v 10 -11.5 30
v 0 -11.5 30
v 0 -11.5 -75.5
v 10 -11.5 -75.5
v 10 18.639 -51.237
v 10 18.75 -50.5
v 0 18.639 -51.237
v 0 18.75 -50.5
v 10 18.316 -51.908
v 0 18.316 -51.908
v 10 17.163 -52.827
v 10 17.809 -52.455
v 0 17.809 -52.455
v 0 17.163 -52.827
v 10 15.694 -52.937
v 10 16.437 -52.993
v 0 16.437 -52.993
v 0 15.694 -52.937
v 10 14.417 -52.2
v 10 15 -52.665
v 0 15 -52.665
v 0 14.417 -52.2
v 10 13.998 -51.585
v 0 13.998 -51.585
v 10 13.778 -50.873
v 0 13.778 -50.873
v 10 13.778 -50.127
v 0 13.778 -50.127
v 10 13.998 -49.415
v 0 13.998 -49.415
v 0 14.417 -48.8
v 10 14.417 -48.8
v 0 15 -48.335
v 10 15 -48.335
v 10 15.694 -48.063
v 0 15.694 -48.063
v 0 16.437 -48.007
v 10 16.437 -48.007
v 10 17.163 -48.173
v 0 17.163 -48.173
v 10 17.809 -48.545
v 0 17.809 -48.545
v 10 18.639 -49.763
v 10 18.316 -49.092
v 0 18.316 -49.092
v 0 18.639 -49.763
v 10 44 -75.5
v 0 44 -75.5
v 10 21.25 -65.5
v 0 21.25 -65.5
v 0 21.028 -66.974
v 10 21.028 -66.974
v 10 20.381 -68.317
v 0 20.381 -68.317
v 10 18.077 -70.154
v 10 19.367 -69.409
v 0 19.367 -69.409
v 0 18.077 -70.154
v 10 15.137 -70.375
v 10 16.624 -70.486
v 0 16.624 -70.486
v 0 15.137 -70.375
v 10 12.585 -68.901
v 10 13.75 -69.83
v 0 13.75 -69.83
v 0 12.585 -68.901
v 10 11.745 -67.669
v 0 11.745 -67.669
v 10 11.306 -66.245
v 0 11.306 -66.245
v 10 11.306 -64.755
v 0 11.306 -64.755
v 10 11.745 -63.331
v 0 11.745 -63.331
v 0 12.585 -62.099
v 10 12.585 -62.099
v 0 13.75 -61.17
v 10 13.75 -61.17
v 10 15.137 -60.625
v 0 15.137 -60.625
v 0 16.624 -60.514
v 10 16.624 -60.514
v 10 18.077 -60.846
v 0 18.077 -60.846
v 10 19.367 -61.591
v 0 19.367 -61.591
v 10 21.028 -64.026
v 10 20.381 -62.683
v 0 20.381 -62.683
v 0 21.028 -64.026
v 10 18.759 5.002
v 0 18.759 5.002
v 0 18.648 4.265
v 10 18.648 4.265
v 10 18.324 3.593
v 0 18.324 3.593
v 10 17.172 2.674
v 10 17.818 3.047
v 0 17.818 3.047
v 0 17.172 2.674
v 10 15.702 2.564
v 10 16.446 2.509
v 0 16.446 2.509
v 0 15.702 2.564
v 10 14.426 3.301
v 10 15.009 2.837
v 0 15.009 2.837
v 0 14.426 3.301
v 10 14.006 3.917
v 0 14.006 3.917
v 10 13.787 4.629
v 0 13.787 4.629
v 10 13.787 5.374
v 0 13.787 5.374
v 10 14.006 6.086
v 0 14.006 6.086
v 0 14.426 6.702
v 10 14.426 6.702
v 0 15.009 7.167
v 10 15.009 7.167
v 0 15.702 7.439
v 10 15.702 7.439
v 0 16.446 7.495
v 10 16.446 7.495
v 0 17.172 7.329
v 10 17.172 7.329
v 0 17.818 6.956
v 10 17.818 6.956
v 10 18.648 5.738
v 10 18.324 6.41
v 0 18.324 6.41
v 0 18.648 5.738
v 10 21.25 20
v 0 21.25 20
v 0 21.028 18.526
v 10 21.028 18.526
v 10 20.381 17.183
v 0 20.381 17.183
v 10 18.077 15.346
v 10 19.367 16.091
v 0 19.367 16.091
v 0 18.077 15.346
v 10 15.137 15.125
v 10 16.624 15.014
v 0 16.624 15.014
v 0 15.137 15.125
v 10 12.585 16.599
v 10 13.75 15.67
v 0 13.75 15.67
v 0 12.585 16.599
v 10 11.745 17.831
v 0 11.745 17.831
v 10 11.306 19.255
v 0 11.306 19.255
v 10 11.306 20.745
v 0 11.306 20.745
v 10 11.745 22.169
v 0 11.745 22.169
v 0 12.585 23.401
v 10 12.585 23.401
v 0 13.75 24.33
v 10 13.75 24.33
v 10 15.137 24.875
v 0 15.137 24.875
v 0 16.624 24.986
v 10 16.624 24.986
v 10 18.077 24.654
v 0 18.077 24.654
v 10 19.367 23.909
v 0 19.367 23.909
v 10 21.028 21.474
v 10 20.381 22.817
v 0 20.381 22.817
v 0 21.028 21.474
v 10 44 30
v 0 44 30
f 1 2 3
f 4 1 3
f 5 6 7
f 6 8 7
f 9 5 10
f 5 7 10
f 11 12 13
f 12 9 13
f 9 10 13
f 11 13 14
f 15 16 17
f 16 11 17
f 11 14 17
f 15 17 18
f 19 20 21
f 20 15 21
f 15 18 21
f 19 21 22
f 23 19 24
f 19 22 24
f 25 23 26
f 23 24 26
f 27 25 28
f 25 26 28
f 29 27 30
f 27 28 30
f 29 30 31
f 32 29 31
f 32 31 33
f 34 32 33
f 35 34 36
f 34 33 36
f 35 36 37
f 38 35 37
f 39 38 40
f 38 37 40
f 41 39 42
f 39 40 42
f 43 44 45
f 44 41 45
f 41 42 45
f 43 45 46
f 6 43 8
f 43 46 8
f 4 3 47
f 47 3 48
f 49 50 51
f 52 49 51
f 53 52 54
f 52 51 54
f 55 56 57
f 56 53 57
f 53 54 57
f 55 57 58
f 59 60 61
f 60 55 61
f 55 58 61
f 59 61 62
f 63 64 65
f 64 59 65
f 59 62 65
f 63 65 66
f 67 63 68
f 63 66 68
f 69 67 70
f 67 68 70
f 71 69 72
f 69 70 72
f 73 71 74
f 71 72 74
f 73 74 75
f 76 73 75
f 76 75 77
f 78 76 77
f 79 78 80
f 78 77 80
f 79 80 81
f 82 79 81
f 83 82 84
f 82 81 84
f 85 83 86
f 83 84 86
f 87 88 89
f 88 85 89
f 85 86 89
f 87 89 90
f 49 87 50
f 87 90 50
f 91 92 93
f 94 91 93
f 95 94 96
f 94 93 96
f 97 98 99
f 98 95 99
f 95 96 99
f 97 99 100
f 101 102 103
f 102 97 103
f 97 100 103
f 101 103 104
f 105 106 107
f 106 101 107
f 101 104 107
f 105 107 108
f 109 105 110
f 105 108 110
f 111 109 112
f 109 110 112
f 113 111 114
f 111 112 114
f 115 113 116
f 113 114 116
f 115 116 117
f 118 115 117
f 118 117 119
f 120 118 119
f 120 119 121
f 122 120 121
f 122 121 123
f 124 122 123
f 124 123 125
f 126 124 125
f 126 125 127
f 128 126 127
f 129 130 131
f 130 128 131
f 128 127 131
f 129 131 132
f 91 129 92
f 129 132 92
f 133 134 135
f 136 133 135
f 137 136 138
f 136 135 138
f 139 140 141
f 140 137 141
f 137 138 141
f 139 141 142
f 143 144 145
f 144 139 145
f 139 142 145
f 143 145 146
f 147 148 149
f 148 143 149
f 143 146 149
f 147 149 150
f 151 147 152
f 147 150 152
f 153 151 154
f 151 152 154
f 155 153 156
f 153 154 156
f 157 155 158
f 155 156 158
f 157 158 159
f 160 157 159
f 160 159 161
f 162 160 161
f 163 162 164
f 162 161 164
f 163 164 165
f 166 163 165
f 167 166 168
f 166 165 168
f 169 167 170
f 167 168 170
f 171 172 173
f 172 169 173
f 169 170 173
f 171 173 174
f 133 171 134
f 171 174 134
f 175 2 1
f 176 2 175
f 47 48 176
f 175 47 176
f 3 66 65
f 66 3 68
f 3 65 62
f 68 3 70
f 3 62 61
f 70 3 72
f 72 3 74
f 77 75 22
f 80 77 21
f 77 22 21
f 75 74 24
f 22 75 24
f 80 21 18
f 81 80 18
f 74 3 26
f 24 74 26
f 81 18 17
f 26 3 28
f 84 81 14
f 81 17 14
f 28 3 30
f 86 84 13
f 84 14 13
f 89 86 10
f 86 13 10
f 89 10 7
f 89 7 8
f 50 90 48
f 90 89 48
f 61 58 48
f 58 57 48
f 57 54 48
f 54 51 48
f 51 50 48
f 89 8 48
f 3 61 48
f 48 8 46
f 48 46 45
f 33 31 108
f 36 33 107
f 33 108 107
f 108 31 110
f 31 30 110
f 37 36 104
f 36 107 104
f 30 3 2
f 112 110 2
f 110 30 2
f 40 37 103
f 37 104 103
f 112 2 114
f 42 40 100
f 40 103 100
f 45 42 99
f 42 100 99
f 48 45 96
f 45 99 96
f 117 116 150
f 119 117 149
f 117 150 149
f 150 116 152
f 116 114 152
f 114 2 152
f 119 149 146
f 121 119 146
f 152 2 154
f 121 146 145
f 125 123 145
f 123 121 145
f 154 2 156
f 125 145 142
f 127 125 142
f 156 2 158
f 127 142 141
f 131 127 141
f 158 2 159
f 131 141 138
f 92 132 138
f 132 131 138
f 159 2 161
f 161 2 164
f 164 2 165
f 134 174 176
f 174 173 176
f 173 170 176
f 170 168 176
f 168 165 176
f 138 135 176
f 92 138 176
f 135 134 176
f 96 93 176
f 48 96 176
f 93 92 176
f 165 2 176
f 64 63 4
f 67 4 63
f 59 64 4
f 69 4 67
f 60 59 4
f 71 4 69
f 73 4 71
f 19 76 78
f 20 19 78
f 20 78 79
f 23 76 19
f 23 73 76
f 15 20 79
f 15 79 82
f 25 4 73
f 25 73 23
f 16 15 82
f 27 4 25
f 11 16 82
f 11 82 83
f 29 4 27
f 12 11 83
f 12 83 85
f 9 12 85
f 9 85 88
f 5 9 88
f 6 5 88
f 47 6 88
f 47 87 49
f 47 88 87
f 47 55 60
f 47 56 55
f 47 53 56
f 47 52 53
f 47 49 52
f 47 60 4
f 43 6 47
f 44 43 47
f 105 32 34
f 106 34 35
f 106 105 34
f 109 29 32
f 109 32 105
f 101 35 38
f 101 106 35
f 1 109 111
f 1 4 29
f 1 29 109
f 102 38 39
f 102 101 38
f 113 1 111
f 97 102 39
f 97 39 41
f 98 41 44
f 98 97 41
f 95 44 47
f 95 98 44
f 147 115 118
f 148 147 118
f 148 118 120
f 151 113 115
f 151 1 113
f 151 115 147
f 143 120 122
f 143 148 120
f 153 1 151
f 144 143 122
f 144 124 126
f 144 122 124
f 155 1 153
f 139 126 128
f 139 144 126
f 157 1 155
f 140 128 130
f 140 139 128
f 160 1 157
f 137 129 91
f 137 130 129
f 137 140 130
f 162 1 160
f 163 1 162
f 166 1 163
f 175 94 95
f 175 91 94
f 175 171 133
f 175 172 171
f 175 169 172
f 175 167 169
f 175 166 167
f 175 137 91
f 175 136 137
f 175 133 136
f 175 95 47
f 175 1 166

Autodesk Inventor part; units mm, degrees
ref_plane "YZ Plane" through (0, 0, 0) normal (1, 0, 0) x (0, 1, 0)
ref_plane "XZ Plane" through (0, 0, 0) normal (0, 1, 0) x (-1, 0, 0)
ref_plane "XY Plane" through (0, 0, 0) normal (0, 0, 1) x (1, 0, 0)
sketch "Sketch1" plane through (0, 0, 0) normal (1, 0, 0) x (0, 1, 0)
  line L0 (-6, -12.5) -> (-6, -12.9)
  arc A0 (-6, -12.9) -> (-5.6, -13.3) centre (-5.6, -12.9) ccw
  line L1 (-5.6, -13.3) -> (-4.9, -13.3)
  arc A1 (-4.9, -13.3) -> (-4.7, -13.1) centre (-4.9, -13.1) ccw
  line L2 (-4.7, -13.1) -> (-4.7, -12.85)
  arc A2 (-4.5, -12.65) -> (-4.7, -12.85) centre (-4.5, -12.85) ccw
  line L3 (-4.5, -12.65) -> (-1.8, -12.65)
  arc A3 (-1.4, -13.05) -> (-1.8, -12.65) centre (-1.8, -13.05) ccw
  line L4 (-1.4, -13.05) -> (-1.4, -18.75)
  line L5 (-1.8, -19.15) -> (-4.5, -19.15)
  arc A4 (-1.8, -19.15) -> (-1.4, -18.75) centre (-1.8, -18.75) ccw
  arc A5 (-4.7, -18.95) -> (-4.5, -19.15) centre (-4.5, -18.95) ccw
  line L6 (-4.7, -18.95) -> (-4.7, -18.7)
  arc A6 (-4.7, -18.7) -> (-4.9, -18.5) centre (-4.9, -18.7) ccw
  line L7 (-4.9, -18.5) -> (-5.6, -18.5)
  arc A7 (-5.6, -18.5) -> (-6, -18.9) centre (-5.6, -18.9) ccw
  line L8 (-6, -18.9) -> (-6, -19.5)
  line L9 (-6.5, -6.5) -> (-6.5, -12.5)
  line L10 (-6.5, -12.5) -> (-2.5, -12.5)
  line L11 (-1.05, -19.5) -> (-6.5, -19.5)
  line L12 (-6.5, -19.5) -> (-6.5, -26)
  line L13 (-6.5, -26) -> (-1.05, -26)
  line L14 (-6, -26) -> (-6, -26.6)
  arc A8 (-6, -26.6) -> (-5.6, -27) centre (-5.6, -26.6) ccw
  line L15 (-5.6, -27) -> (-4.9, -27)
  arc A9 (-4.9, -27) -> (-4.7, -26.8) centre (-4.9, -26.8) ccw
  arc A10 (-4.5, -26.35) -> (-4.7, -26.55) centre (-4.5, -26.55) ccw
  line L16 (-4.7, -26.8) -> (-4.7, -26.55)
  line L17 (-4.5, -26.35) -> (-1.8, -26.35)
  arc A11 (-1.4, -26.75) -> (-1.8, -26.35) centre (-1.8, -26.75) ccw
  line L18 (-1.4, -26.75) -> (-1.4, -32.45)
  arc A12 (-1.8, -32.85) -> (-1.4, -32.45) centre (-1.8, -32.45) ccw
  line L19 (-1.8, -32.85) -> (-4.5, -32.85)
  arc A13 (-4.7, -32.65) -> (-4.5, -32.85) centre (-4.5, -32.65) ccw
  line L20 (-4.7, -32.65) -> (-4.7, -32.4)
  arc A14 (-4.7, -32.4) -> (-4.9, -32.2) centre (-4.9, -32.4) ccw
  line L21 (-4.9, -32.2) -> (-5.6, -32.2)
  arc A15 (-5.6, -32.2) -> (-6, -32.6) centre (-5.6, -32.6) ccw
  line L22 (-6, -32.6) -> (-6, -33)
  line L23 (-2.5, -33) -> (-6.5, -33)
  line L24 (-6.5, -33) -> (-6.5, -39)
  line L25 (32.5, 0) -> (0, 0)
  circle A16 centre (0, -6.5) radius 4.75
  circle A17 centre (32.5, -6.5) radius 4.75
  circle A18 centre (0, -39) radius 4.75
  circle A19 centre (32.5, -39) radius 4.75
  line L26 (39, -26) -> (39, -19.5)
  line L27 (39, -12.5) -> (39, -6.5)
  line L28 (39, -39) -> (39, -33)
  line L29 (26.5, -45.5) -> (32.5, -45.5)
  line L30 (0, -45.5) -> (6, -45.5)
  line L31 (13, -45.5) -> (19.5, -45.5)
  circle A20 centre (16.2588, 5.0016) radius 2.5
  circle A21 centre (16.25, -50.5) radius 2.5
  line L32 (44, 10) -> (-11.5, 10)
  line L33 (-11.5, 10) -> (-11.5, -55.5)
  line L34 (-11.5, -55.5) -> (44, -55.5)
  line L35 (44, -55.5) -> (44, 10)
  line L36 (44, 10) -> (-11.5, 10)
  line L37 (-11.5, 10) -> (-11.5, 30)
  line L38 (-11.5, 30) -> (44, 30)
  line L39 (44, 30) -> (44, 10)
  line L40 (44, -55.5) -> (-11.5, -55.5)
  line L41 (-11.5, -55.5) -> (-11.5, -75.5)
  line L42 (-11.5, -75.5) -> (44, -75.5)
  line L43 (44, -75.5) -> (44, -55.5)
  circle A22 centre (16.25, 20) radius 5
  circle A23 centre (16.25, -65.5) radius 5
  point P0 (24.75, -17.8425)
  point P1 (-11.5, 10)
  dimension "d0" = 20
  dimension "d1" = 20
  dimension "d2" = 10
  dimension "d3" = 10
extrude "Extrusion1" add sketch "Sketch1" along normal blind 10 contours A16 | A17 | A18 | A19 | L35 L34 L33 L32 | L32 L37 L38 L39 | L43 L42 L41 L34
properties part number "PlacaBaseHidráulicos_CPY"
